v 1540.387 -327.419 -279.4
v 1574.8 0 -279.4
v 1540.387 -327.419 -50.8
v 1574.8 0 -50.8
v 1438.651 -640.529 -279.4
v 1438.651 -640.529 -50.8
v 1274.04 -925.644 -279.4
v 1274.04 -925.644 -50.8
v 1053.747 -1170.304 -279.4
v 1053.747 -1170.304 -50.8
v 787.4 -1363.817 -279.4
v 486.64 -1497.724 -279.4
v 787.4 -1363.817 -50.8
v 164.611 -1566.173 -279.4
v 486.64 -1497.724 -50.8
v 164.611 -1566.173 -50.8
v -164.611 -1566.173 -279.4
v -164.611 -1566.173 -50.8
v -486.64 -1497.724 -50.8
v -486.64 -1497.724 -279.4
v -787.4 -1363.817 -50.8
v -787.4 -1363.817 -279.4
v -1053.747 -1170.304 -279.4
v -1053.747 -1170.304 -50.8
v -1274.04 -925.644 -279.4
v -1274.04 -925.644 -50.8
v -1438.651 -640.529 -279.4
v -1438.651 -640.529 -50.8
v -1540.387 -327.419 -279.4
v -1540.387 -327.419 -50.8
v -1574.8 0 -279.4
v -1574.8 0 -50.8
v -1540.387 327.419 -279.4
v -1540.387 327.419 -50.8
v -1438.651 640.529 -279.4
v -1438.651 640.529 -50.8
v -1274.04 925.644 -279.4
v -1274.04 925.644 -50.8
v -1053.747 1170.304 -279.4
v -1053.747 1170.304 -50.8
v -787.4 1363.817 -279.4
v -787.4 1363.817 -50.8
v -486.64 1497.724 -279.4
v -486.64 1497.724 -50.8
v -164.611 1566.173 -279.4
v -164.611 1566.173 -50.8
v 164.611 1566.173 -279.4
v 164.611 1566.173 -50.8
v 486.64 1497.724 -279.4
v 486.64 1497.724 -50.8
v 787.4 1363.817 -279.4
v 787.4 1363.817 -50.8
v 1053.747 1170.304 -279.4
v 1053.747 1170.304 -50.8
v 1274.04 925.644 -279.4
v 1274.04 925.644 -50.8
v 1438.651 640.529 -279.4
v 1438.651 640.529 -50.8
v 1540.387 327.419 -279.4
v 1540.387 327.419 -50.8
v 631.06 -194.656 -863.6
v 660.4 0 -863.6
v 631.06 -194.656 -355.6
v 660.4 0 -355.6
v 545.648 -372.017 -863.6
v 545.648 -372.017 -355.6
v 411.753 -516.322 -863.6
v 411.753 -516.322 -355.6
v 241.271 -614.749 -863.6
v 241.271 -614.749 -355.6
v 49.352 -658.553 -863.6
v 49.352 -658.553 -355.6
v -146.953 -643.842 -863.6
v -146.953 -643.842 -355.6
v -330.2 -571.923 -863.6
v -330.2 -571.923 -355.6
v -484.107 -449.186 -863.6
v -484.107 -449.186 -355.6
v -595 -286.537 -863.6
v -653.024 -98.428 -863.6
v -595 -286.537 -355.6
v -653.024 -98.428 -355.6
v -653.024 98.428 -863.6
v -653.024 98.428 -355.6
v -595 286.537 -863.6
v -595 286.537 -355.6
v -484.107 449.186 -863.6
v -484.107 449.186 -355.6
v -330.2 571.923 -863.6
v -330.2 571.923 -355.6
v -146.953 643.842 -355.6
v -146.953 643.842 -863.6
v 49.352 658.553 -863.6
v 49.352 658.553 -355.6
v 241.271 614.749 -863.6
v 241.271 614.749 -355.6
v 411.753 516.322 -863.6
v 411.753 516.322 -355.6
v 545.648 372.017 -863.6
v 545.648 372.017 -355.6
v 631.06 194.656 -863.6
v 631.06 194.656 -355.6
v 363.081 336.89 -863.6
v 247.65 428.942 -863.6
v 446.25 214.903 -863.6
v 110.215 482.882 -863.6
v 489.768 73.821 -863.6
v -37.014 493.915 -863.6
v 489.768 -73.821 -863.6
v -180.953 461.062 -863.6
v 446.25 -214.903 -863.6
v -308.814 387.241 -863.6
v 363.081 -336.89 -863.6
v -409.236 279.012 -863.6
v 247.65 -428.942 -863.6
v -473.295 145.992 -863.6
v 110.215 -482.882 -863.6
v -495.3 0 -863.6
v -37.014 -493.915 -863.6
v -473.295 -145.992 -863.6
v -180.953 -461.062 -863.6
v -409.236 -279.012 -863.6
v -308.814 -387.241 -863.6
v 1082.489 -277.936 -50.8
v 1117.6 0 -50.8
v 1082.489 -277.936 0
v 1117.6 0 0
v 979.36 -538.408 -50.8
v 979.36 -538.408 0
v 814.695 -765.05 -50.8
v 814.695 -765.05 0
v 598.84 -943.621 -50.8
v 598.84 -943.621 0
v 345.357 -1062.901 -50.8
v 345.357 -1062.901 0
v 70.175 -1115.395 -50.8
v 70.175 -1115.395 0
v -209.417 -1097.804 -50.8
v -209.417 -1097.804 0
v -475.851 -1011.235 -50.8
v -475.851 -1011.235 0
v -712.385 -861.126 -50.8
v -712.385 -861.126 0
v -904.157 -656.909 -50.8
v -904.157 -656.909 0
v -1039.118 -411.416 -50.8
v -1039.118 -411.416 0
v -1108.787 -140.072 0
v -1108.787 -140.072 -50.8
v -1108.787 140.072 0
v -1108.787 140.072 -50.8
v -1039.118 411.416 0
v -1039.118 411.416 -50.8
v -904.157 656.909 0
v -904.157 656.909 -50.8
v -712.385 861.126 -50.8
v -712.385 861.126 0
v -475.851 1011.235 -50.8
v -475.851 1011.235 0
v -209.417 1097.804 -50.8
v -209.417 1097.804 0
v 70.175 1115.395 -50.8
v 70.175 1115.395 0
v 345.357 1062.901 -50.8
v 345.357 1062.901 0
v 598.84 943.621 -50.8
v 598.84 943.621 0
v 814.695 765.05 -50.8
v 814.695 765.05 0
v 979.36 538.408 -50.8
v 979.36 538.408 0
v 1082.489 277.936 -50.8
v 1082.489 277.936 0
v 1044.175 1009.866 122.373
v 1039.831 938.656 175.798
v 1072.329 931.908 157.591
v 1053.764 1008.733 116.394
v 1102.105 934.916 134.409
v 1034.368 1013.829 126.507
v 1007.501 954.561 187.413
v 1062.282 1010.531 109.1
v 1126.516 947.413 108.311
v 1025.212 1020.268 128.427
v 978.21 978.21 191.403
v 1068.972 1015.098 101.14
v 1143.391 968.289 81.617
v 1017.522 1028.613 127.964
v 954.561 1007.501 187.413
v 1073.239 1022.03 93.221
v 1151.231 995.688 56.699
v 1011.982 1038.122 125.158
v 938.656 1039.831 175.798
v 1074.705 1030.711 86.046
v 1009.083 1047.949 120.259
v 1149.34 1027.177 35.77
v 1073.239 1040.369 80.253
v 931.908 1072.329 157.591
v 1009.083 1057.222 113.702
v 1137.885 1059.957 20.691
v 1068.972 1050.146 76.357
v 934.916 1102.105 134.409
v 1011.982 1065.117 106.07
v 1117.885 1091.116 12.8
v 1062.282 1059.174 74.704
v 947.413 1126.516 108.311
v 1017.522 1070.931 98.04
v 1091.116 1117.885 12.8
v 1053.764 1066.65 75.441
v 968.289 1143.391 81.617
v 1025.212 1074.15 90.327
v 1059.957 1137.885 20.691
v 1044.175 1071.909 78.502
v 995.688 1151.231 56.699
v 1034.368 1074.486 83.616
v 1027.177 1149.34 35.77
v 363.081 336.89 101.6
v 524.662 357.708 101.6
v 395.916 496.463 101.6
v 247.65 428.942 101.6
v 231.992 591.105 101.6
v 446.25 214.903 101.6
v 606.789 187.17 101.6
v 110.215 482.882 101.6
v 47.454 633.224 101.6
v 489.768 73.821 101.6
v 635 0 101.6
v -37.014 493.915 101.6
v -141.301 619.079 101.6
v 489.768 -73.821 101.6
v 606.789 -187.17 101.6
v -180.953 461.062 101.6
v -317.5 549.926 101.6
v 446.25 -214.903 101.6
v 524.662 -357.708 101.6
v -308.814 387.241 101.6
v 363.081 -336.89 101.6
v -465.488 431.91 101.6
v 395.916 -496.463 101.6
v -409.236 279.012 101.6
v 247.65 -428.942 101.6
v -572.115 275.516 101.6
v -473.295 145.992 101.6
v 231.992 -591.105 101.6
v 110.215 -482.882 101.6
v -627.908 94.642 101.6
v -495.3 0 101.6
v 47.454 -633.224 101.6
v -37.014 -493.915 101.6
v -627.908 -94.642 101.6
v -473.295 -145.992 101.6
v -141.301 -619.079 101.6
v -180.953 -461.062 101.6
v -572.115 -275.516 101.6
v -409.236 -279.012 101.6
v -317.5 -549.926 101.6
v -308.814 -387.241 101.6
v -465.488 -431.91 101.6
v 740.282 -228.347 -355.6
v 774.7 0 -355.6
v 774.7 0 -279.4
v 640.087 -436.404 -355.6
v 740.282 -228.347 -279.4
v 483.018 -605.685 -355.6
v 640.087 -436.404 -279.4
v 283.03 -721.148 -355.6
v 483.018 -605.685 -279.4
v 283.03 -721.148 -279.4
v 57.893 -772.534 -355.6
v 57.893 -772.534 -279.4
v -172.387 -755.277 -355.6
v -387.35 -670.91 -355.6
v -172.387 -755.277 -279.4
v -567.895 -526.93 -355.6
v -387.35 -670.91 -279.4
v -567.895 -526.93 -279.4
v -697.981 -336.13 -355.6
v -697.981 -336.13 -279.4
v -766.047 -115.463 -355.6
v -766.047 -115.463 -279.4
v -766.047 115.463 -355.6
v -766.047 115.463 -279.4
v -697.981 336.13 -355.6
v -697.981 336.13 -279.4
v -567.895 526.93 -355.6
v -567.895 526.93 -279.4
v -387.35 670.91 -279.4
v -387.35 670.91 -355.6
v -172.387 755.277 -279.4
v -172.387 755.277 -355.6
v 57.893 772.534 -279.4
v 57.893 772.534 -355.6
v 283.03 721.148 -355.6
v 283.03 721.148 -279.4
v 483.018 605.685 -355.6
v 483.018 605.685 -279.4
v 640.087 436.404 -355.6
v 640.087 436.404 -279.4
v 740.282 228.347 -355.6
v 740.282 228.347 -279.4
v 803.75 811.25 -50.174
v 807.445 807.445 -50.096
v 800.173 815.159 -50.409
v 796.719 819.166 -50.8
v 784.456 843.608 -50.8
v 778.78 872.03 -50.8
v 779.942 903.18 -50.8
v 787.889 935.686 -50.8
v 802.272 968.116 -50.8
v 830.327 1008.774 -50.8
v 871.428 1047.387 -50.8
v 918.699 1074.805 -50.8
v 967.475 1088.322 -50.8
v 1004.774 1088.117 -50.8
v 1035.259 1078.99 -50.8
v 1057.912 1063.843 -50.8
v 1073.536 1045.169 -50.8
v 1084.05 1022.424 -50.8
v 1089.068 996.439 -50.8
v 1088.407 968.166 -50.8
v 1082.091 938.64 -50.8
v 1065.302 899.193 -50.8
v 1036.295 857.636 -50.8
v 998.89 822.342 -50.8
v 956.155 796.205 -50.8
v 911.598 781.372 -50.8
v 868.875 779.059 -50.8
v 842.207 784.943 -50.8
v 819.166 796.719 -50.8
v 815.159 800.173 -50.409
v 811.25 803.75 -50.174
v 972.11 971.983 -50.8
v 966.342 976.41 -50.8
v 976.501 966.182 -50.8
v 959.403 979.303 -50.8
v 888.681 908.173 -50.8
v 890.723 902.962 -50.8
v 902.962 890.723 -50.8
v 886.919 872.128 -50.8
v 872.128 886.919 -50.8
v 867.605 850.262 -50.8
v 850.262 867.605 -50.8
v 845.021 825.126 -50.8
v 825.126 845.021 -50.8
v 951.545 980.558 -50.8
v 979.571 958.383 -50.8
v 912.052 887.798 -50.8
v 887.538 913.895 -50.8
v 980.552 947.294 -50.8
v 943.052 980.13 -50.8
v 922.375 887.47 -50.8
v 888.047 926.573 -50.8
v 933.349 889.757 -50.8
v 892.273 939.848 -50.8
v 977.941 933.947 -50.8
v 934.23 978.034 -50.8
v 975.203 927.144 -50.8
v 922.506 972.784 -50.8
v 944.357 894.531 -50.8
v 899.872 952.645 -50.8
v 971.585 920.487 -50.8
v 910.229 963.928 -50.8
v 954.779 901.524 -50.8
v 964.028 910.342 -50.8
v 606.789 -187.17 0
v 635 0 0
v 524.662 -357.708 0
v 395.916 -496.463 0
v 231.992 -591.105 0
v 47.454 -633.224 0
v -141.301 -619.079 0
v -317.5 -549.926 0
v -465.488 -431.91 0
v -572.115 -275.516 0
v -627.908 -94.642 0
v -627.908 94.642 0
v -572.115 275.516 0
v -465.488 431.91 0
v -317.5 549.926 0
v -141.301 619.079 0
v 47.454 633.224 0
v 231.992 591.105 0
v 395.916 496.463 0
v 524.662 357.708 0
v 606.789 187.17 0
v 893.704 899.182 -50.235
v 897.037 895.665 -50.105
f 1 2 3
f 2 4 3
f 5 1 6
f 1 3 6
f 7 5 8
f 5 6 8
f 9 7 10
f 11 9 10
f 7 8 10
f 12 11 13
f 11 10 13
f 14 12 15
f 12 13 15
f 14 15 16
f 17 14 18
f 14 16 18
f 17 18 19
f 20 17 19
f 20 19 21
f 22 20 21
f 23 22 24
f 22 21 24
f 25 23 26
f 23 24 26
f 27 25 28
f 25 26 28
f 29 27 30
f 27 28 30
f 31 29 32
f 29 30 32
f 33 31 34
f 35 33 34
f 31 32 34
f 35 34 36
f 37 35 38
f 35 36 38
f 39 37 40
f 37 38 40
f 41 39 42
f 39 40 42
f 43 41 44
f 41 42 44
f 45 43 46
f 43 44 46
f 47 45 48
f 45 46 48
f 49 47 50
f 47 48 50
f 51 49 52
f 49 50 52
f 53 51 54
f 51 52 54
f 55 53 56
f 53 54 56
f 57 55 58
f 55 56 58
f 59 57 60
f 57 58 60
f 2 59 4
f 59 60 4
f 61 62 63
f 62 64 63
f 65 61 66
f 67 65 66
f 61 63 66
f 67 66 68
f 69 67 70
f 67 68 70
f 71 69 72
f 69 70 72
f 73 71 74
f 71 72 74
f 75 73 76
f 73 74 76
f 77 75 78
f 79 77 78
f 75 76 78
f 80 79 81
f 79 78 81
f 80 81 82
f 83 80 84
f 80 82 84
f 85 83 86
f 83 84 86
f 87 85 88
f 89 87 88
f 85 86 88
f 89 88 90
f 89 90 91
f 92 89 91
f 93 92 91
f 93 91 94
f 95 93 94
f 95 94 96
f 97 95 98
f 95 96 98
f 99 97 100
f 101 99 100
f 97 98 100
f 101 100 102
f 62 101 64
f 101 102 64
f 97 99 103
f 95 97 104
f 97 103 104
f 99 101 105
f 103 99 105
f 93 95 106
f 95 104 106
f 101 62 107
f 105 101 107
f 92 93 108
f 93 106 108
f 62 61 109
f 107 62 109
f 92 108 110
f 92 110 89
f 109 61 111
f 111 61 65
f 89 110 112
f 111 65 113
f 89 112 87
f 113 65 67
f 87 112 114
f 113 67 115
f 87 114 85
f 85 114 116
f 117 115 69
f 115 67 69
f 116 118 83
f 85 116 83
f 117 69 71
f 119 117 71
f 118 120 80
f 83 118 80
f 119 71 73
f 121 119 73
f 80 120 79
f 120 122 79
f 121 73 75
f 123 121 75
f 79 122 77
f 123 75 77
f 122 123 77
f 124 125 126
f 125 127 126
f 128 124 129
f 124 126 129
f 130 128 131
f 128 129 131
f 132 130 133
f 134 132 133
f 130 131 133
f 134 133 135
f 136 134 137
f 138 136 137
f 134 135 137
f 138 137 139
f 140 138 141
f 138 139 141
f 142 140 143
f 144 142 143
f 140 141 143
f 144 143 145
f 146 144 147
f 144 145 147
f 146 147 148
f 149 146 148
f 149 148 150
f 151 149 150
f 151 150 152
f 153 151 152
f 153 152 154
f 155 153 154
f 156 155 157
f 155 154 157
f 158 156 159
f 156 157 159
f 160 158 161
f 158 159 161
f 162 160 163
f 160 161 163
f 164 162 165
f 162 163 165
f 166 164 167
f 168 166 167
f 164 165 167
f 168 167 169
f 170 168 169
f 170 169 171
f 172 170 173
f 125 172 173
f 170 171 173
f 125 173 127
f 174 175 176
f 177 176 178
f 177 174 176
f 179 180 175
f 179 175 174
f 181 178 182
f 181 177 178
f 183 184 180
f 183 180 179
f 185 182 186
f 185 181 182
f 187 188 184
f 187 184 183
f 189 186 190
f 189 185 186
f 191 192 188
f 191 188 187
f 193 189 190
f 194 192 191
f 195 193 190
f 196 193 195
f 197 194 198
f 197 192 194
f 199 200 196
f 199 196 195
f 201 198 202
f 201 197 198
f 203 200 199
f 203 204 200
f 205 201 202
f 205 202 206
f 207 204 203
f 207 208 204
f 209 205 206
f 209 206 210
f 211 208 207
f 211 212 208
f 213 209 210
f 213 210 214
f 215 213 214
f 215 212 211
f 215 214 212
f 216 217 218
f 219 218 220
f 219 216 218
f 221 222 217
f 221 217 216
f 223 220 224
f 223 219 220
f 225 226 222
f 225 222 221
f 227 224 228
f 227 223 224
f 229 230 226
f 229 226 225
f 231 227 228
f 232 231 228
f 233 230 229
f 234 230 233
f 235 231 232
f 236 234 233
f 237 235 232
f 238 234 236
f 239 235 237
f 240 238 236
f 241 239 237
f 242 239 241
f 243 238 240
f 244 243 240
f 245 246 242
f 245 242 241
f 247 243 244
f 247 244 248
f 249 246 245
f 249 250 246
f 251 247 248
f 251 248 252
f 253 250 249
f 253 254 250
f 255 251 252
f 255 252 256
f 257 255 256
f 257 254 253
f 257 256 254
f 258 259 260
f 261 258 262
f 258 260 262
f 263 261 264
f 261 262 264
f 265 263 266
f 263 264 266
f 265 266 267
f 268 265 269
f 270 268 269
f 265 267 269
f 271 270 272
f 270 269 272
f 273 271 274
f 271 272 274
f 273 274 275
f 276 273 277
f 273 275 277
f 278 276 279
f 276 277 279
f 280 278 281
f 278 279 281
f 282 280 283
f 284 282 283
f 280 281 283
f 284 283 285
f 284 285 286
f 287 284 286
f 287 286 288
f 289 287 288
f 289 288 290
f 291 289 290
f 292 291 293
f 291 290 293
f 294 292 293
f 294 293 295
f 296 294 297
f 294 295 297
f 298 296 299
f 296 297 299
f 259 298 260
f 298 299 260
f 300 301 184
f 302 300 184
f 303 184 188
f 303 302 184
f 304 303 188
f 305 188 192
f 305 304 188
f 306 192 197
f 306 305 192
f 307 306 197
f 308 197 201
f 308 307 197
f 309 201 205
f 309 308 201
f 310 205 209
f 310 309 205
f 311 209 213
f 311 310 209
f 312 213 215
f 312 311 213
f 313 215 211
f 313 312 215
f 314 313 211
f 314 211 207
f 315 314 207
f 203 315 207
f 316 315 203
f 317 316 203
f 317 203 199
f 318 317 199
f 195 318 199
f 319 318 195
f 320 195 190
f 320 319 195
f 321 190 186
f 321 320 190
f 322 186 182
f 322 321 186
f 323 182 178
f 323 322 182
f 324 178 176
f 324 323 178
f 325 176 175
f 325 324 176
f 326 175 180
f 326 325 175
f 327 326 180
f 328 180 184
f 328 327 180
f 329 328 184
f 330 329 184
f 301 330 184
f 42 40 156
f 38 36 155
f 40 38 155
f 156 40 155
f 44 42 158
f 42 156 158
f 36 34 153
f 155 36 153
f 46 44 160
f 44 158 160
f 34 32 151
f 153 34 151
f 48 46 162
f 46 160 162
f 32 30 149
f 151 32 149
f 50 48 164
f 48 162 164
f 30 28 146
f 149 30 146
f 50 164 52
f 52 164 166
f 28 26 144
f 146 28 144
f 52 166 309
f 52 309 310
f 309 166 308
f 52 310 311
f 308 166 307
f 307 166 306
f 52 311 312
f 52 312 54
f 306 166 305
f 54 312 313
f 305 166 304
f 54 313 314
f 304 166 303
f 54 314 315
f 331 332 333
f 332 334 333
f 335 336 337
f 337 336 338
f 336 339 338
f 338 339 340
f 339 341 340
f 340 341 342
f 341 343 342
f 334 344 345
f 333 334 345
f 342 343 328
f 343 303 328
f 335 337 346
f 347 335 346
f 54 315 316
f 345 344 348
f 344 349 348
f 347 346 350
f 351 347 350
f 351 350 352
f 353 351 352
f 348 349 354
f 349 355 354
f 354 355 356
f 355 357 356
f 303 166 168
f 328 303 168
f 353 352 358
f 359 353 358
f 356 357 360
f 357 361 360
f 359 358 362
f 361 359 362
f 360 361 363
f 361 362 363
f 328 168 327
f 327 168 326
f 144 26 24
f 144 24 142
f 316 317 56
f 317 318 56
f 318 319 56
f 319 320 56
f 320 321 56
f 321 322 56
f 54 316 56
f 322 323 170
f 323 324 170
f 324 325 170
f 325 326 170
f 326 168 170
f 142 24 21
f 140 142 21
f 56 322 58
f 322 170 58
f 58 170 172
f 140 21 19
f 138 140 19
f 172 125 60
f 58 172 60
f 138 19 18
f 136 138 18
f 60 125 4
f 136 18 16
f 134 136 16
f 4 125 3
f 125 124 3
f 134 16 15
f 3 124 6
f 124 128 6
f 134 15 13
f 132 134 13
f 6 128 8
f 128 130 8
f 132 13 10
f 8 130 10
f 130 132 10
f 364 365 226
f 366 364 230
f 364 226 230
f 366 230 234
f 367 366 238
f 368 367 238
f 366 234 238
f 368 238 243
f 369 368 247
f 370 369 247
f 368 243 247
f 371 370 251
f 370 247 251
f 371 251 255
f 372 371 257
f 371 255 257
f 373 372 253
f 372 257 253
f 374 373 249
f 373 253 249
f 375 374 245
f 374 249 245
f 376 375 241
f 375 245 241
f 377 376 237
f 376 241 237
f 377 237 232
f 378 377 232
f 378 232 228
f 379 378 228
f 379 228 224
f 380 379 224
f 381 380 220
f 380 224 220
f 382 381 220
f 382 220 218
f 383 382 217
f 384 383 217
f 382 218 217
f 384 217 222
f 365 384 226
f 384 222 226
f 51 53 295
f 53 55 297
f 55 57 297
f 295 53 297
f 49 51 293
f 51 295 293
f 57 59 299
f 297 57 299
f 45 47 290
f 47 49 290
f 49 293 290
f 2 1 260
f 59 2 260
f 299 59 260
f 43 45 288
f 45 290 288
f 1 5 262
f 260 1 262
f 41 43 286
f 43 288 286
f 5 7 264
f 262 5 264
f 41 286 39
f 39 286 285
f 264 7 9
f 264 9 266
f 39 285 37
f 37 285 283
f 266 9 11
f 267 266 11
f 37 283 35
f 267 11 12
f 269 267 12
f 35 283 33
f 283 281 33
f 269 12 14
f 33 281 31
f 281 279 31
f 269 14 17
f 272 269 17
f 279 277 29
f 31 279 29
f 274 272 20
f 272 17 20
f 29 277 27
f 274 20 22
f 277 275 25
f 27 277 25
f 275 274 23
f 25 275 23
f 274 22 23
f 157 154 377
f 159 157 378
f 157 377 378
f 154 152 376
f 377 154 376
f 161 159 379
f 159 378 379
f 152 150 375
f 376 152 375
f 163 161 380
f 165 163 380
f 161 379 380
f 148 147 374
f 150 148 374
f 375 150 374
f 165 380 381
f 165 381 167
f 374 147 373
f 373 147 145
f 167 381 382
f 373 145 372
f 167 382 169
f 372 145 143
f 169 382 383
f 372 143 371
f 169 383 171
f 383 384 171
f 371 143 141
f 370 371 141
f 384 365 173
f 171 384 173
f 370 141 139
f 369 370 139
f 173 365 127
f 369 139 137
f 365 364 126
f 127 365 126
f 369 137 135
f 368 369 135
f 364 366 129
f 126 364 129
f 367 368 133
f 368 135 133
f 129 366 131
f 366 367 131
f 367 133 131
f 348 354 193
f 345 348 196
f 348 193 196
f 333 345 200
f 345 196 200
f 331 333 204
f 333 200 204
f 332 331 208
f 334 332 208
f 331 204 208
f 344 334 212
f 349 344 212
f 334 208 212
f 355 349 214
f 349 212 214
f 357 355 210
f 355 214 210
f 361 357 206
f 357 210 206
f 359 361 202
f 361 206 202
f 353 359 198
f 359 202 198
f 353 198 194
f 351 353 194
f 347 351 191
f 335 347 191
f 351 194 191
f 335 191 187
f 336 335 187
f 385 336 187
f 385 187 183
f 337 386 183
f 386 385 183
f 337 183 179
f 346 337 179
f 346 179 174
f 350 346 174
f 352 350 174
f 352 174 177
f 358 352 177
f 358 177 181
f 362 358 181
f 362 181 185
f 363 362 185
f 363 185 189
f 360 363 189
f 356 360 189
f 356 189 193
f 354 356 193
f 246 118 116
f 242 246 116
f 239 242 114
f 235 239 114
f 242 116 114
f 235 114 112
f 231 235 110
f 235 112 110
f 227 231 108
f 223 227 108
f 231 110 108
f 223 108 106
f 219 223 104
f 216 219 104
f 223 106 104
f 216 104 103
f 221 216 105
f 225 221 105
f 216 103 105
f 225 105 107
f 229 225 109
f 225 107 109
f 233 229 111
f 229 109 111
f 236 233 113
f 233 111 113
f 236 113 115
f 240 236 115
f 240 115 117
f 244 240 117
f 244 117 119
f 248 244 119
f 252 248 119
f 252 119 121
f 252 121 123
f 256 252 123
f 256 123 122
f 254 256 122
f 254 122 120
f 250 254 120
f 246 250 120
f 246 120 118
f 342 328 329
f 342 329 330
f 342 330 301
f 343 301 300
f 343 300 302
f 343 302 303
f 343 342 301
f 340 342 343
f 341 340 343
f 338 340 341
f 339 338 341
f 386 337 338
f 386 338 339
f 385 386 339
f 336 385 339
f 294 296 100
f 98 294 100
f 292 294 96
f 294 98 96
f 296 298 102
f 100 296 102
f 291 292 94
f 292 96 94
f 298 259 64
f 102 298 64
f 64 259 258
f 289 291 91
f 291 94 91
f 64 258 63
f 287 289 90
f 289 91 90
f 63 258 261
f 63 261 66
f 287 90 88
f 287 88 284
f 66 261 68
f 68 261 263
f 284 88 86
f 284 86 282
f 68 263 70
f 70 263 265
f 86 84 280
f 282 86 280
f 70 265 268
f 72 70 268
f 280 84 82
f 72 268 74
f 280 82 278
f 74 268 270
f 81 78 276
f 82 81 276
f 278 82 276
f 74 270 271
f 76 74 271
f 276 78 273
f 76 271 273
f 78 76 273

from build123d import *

# Parameters (mm, degrees)
F0_W      = 635
F0_H      = 101.6
F0_W_2    = 660.4
F0_H_2    = 508
F3_D      = 990.6
F9_R      = 38.1
F10_REACH = 3406.7732486981


# Not quite as in the source:
# - a feature names something its author has since deleted; it is built from what else it names


with BuildPart() as f1:
    # F0 (on Front) → F1 (revolve)
    with BuildSketch(Plane.XZ):
        with Locations((317.5, 50.8)):
            Rectangle(F0_W, F0_H)
        Polygon((635, 0), (0, 0), (0, -50.8), (1117.6, -50.8), (1117.6, 0), align=None)
        Polygon((1117.6, -50.8), (0, -50.8), (0, -279.4), (774.7, -279.4), (1574.8, -279.4), (1574.8, -50.8), align=None)
        Polygon((774.7, -279.4), (0, -279.4), (0, -355.6), (660.4, -355.6), (774.7, -355.6), align=None)
        with Locations((330.2, -609.6)):
            Rectangle(F0_W_2, F0_H_2)
    revolve(axis=Axis((0, 0, -260.6765925884), (0, 0, -1)))

    # F3 (through all)
    with Locations(Plane.XY.offset(101.6)):
        with Locations((0, 0)):
            Hole(F3_D / 2)

    # F6 (on face) → F7 (revolve)
    with BuildSketch(Plane(origin=(0, 0, 0), x_dir=(0.7071067812, 0.7071067812, 0), z_dir=(0.7071067812, -0.7071067812, 0))):
        Polygon((1321.5041428375, -50.0958571625), (1473.2, 101.6), (1383.3974387893, 191.4025612107), (1141.8990204161, -50.0958571625), align=None)
    revolve(axis=Axis((867.2468509569, 867.2468509569, -145.1277414514), (-0.5, -0.5, -0.7071067812)))

    f10_end = Plane(origin=(-16.75319514, -16.75319514, -50.8), x_dir=(1, 0, 0), z_dir=(0, 0, 1))
    # F9 (on face) → F10 (cut, up to a plane its end follows)
    with BuildSketch(Plane(origin=(556.7758795063, 556.7758795063, 787.4), x_dir=(0.8660254038, -0.2886751346, -0.4082482905), z_dir=(0.5, 0.5, 0.7071067812))):
        with Locations((559.9533552002, 791.8936292205)):
            Circle(F9_R)
    f10_long = extrude(amount=-F10_REACH, mode=Mode.PRIVATE)
    add(split(f10_long, bisect_by=f10_end, keep=Keep.TOP, mode=Mode.PRIVATE), mode=Mode.SUBTRACT)


solid = f1.part
